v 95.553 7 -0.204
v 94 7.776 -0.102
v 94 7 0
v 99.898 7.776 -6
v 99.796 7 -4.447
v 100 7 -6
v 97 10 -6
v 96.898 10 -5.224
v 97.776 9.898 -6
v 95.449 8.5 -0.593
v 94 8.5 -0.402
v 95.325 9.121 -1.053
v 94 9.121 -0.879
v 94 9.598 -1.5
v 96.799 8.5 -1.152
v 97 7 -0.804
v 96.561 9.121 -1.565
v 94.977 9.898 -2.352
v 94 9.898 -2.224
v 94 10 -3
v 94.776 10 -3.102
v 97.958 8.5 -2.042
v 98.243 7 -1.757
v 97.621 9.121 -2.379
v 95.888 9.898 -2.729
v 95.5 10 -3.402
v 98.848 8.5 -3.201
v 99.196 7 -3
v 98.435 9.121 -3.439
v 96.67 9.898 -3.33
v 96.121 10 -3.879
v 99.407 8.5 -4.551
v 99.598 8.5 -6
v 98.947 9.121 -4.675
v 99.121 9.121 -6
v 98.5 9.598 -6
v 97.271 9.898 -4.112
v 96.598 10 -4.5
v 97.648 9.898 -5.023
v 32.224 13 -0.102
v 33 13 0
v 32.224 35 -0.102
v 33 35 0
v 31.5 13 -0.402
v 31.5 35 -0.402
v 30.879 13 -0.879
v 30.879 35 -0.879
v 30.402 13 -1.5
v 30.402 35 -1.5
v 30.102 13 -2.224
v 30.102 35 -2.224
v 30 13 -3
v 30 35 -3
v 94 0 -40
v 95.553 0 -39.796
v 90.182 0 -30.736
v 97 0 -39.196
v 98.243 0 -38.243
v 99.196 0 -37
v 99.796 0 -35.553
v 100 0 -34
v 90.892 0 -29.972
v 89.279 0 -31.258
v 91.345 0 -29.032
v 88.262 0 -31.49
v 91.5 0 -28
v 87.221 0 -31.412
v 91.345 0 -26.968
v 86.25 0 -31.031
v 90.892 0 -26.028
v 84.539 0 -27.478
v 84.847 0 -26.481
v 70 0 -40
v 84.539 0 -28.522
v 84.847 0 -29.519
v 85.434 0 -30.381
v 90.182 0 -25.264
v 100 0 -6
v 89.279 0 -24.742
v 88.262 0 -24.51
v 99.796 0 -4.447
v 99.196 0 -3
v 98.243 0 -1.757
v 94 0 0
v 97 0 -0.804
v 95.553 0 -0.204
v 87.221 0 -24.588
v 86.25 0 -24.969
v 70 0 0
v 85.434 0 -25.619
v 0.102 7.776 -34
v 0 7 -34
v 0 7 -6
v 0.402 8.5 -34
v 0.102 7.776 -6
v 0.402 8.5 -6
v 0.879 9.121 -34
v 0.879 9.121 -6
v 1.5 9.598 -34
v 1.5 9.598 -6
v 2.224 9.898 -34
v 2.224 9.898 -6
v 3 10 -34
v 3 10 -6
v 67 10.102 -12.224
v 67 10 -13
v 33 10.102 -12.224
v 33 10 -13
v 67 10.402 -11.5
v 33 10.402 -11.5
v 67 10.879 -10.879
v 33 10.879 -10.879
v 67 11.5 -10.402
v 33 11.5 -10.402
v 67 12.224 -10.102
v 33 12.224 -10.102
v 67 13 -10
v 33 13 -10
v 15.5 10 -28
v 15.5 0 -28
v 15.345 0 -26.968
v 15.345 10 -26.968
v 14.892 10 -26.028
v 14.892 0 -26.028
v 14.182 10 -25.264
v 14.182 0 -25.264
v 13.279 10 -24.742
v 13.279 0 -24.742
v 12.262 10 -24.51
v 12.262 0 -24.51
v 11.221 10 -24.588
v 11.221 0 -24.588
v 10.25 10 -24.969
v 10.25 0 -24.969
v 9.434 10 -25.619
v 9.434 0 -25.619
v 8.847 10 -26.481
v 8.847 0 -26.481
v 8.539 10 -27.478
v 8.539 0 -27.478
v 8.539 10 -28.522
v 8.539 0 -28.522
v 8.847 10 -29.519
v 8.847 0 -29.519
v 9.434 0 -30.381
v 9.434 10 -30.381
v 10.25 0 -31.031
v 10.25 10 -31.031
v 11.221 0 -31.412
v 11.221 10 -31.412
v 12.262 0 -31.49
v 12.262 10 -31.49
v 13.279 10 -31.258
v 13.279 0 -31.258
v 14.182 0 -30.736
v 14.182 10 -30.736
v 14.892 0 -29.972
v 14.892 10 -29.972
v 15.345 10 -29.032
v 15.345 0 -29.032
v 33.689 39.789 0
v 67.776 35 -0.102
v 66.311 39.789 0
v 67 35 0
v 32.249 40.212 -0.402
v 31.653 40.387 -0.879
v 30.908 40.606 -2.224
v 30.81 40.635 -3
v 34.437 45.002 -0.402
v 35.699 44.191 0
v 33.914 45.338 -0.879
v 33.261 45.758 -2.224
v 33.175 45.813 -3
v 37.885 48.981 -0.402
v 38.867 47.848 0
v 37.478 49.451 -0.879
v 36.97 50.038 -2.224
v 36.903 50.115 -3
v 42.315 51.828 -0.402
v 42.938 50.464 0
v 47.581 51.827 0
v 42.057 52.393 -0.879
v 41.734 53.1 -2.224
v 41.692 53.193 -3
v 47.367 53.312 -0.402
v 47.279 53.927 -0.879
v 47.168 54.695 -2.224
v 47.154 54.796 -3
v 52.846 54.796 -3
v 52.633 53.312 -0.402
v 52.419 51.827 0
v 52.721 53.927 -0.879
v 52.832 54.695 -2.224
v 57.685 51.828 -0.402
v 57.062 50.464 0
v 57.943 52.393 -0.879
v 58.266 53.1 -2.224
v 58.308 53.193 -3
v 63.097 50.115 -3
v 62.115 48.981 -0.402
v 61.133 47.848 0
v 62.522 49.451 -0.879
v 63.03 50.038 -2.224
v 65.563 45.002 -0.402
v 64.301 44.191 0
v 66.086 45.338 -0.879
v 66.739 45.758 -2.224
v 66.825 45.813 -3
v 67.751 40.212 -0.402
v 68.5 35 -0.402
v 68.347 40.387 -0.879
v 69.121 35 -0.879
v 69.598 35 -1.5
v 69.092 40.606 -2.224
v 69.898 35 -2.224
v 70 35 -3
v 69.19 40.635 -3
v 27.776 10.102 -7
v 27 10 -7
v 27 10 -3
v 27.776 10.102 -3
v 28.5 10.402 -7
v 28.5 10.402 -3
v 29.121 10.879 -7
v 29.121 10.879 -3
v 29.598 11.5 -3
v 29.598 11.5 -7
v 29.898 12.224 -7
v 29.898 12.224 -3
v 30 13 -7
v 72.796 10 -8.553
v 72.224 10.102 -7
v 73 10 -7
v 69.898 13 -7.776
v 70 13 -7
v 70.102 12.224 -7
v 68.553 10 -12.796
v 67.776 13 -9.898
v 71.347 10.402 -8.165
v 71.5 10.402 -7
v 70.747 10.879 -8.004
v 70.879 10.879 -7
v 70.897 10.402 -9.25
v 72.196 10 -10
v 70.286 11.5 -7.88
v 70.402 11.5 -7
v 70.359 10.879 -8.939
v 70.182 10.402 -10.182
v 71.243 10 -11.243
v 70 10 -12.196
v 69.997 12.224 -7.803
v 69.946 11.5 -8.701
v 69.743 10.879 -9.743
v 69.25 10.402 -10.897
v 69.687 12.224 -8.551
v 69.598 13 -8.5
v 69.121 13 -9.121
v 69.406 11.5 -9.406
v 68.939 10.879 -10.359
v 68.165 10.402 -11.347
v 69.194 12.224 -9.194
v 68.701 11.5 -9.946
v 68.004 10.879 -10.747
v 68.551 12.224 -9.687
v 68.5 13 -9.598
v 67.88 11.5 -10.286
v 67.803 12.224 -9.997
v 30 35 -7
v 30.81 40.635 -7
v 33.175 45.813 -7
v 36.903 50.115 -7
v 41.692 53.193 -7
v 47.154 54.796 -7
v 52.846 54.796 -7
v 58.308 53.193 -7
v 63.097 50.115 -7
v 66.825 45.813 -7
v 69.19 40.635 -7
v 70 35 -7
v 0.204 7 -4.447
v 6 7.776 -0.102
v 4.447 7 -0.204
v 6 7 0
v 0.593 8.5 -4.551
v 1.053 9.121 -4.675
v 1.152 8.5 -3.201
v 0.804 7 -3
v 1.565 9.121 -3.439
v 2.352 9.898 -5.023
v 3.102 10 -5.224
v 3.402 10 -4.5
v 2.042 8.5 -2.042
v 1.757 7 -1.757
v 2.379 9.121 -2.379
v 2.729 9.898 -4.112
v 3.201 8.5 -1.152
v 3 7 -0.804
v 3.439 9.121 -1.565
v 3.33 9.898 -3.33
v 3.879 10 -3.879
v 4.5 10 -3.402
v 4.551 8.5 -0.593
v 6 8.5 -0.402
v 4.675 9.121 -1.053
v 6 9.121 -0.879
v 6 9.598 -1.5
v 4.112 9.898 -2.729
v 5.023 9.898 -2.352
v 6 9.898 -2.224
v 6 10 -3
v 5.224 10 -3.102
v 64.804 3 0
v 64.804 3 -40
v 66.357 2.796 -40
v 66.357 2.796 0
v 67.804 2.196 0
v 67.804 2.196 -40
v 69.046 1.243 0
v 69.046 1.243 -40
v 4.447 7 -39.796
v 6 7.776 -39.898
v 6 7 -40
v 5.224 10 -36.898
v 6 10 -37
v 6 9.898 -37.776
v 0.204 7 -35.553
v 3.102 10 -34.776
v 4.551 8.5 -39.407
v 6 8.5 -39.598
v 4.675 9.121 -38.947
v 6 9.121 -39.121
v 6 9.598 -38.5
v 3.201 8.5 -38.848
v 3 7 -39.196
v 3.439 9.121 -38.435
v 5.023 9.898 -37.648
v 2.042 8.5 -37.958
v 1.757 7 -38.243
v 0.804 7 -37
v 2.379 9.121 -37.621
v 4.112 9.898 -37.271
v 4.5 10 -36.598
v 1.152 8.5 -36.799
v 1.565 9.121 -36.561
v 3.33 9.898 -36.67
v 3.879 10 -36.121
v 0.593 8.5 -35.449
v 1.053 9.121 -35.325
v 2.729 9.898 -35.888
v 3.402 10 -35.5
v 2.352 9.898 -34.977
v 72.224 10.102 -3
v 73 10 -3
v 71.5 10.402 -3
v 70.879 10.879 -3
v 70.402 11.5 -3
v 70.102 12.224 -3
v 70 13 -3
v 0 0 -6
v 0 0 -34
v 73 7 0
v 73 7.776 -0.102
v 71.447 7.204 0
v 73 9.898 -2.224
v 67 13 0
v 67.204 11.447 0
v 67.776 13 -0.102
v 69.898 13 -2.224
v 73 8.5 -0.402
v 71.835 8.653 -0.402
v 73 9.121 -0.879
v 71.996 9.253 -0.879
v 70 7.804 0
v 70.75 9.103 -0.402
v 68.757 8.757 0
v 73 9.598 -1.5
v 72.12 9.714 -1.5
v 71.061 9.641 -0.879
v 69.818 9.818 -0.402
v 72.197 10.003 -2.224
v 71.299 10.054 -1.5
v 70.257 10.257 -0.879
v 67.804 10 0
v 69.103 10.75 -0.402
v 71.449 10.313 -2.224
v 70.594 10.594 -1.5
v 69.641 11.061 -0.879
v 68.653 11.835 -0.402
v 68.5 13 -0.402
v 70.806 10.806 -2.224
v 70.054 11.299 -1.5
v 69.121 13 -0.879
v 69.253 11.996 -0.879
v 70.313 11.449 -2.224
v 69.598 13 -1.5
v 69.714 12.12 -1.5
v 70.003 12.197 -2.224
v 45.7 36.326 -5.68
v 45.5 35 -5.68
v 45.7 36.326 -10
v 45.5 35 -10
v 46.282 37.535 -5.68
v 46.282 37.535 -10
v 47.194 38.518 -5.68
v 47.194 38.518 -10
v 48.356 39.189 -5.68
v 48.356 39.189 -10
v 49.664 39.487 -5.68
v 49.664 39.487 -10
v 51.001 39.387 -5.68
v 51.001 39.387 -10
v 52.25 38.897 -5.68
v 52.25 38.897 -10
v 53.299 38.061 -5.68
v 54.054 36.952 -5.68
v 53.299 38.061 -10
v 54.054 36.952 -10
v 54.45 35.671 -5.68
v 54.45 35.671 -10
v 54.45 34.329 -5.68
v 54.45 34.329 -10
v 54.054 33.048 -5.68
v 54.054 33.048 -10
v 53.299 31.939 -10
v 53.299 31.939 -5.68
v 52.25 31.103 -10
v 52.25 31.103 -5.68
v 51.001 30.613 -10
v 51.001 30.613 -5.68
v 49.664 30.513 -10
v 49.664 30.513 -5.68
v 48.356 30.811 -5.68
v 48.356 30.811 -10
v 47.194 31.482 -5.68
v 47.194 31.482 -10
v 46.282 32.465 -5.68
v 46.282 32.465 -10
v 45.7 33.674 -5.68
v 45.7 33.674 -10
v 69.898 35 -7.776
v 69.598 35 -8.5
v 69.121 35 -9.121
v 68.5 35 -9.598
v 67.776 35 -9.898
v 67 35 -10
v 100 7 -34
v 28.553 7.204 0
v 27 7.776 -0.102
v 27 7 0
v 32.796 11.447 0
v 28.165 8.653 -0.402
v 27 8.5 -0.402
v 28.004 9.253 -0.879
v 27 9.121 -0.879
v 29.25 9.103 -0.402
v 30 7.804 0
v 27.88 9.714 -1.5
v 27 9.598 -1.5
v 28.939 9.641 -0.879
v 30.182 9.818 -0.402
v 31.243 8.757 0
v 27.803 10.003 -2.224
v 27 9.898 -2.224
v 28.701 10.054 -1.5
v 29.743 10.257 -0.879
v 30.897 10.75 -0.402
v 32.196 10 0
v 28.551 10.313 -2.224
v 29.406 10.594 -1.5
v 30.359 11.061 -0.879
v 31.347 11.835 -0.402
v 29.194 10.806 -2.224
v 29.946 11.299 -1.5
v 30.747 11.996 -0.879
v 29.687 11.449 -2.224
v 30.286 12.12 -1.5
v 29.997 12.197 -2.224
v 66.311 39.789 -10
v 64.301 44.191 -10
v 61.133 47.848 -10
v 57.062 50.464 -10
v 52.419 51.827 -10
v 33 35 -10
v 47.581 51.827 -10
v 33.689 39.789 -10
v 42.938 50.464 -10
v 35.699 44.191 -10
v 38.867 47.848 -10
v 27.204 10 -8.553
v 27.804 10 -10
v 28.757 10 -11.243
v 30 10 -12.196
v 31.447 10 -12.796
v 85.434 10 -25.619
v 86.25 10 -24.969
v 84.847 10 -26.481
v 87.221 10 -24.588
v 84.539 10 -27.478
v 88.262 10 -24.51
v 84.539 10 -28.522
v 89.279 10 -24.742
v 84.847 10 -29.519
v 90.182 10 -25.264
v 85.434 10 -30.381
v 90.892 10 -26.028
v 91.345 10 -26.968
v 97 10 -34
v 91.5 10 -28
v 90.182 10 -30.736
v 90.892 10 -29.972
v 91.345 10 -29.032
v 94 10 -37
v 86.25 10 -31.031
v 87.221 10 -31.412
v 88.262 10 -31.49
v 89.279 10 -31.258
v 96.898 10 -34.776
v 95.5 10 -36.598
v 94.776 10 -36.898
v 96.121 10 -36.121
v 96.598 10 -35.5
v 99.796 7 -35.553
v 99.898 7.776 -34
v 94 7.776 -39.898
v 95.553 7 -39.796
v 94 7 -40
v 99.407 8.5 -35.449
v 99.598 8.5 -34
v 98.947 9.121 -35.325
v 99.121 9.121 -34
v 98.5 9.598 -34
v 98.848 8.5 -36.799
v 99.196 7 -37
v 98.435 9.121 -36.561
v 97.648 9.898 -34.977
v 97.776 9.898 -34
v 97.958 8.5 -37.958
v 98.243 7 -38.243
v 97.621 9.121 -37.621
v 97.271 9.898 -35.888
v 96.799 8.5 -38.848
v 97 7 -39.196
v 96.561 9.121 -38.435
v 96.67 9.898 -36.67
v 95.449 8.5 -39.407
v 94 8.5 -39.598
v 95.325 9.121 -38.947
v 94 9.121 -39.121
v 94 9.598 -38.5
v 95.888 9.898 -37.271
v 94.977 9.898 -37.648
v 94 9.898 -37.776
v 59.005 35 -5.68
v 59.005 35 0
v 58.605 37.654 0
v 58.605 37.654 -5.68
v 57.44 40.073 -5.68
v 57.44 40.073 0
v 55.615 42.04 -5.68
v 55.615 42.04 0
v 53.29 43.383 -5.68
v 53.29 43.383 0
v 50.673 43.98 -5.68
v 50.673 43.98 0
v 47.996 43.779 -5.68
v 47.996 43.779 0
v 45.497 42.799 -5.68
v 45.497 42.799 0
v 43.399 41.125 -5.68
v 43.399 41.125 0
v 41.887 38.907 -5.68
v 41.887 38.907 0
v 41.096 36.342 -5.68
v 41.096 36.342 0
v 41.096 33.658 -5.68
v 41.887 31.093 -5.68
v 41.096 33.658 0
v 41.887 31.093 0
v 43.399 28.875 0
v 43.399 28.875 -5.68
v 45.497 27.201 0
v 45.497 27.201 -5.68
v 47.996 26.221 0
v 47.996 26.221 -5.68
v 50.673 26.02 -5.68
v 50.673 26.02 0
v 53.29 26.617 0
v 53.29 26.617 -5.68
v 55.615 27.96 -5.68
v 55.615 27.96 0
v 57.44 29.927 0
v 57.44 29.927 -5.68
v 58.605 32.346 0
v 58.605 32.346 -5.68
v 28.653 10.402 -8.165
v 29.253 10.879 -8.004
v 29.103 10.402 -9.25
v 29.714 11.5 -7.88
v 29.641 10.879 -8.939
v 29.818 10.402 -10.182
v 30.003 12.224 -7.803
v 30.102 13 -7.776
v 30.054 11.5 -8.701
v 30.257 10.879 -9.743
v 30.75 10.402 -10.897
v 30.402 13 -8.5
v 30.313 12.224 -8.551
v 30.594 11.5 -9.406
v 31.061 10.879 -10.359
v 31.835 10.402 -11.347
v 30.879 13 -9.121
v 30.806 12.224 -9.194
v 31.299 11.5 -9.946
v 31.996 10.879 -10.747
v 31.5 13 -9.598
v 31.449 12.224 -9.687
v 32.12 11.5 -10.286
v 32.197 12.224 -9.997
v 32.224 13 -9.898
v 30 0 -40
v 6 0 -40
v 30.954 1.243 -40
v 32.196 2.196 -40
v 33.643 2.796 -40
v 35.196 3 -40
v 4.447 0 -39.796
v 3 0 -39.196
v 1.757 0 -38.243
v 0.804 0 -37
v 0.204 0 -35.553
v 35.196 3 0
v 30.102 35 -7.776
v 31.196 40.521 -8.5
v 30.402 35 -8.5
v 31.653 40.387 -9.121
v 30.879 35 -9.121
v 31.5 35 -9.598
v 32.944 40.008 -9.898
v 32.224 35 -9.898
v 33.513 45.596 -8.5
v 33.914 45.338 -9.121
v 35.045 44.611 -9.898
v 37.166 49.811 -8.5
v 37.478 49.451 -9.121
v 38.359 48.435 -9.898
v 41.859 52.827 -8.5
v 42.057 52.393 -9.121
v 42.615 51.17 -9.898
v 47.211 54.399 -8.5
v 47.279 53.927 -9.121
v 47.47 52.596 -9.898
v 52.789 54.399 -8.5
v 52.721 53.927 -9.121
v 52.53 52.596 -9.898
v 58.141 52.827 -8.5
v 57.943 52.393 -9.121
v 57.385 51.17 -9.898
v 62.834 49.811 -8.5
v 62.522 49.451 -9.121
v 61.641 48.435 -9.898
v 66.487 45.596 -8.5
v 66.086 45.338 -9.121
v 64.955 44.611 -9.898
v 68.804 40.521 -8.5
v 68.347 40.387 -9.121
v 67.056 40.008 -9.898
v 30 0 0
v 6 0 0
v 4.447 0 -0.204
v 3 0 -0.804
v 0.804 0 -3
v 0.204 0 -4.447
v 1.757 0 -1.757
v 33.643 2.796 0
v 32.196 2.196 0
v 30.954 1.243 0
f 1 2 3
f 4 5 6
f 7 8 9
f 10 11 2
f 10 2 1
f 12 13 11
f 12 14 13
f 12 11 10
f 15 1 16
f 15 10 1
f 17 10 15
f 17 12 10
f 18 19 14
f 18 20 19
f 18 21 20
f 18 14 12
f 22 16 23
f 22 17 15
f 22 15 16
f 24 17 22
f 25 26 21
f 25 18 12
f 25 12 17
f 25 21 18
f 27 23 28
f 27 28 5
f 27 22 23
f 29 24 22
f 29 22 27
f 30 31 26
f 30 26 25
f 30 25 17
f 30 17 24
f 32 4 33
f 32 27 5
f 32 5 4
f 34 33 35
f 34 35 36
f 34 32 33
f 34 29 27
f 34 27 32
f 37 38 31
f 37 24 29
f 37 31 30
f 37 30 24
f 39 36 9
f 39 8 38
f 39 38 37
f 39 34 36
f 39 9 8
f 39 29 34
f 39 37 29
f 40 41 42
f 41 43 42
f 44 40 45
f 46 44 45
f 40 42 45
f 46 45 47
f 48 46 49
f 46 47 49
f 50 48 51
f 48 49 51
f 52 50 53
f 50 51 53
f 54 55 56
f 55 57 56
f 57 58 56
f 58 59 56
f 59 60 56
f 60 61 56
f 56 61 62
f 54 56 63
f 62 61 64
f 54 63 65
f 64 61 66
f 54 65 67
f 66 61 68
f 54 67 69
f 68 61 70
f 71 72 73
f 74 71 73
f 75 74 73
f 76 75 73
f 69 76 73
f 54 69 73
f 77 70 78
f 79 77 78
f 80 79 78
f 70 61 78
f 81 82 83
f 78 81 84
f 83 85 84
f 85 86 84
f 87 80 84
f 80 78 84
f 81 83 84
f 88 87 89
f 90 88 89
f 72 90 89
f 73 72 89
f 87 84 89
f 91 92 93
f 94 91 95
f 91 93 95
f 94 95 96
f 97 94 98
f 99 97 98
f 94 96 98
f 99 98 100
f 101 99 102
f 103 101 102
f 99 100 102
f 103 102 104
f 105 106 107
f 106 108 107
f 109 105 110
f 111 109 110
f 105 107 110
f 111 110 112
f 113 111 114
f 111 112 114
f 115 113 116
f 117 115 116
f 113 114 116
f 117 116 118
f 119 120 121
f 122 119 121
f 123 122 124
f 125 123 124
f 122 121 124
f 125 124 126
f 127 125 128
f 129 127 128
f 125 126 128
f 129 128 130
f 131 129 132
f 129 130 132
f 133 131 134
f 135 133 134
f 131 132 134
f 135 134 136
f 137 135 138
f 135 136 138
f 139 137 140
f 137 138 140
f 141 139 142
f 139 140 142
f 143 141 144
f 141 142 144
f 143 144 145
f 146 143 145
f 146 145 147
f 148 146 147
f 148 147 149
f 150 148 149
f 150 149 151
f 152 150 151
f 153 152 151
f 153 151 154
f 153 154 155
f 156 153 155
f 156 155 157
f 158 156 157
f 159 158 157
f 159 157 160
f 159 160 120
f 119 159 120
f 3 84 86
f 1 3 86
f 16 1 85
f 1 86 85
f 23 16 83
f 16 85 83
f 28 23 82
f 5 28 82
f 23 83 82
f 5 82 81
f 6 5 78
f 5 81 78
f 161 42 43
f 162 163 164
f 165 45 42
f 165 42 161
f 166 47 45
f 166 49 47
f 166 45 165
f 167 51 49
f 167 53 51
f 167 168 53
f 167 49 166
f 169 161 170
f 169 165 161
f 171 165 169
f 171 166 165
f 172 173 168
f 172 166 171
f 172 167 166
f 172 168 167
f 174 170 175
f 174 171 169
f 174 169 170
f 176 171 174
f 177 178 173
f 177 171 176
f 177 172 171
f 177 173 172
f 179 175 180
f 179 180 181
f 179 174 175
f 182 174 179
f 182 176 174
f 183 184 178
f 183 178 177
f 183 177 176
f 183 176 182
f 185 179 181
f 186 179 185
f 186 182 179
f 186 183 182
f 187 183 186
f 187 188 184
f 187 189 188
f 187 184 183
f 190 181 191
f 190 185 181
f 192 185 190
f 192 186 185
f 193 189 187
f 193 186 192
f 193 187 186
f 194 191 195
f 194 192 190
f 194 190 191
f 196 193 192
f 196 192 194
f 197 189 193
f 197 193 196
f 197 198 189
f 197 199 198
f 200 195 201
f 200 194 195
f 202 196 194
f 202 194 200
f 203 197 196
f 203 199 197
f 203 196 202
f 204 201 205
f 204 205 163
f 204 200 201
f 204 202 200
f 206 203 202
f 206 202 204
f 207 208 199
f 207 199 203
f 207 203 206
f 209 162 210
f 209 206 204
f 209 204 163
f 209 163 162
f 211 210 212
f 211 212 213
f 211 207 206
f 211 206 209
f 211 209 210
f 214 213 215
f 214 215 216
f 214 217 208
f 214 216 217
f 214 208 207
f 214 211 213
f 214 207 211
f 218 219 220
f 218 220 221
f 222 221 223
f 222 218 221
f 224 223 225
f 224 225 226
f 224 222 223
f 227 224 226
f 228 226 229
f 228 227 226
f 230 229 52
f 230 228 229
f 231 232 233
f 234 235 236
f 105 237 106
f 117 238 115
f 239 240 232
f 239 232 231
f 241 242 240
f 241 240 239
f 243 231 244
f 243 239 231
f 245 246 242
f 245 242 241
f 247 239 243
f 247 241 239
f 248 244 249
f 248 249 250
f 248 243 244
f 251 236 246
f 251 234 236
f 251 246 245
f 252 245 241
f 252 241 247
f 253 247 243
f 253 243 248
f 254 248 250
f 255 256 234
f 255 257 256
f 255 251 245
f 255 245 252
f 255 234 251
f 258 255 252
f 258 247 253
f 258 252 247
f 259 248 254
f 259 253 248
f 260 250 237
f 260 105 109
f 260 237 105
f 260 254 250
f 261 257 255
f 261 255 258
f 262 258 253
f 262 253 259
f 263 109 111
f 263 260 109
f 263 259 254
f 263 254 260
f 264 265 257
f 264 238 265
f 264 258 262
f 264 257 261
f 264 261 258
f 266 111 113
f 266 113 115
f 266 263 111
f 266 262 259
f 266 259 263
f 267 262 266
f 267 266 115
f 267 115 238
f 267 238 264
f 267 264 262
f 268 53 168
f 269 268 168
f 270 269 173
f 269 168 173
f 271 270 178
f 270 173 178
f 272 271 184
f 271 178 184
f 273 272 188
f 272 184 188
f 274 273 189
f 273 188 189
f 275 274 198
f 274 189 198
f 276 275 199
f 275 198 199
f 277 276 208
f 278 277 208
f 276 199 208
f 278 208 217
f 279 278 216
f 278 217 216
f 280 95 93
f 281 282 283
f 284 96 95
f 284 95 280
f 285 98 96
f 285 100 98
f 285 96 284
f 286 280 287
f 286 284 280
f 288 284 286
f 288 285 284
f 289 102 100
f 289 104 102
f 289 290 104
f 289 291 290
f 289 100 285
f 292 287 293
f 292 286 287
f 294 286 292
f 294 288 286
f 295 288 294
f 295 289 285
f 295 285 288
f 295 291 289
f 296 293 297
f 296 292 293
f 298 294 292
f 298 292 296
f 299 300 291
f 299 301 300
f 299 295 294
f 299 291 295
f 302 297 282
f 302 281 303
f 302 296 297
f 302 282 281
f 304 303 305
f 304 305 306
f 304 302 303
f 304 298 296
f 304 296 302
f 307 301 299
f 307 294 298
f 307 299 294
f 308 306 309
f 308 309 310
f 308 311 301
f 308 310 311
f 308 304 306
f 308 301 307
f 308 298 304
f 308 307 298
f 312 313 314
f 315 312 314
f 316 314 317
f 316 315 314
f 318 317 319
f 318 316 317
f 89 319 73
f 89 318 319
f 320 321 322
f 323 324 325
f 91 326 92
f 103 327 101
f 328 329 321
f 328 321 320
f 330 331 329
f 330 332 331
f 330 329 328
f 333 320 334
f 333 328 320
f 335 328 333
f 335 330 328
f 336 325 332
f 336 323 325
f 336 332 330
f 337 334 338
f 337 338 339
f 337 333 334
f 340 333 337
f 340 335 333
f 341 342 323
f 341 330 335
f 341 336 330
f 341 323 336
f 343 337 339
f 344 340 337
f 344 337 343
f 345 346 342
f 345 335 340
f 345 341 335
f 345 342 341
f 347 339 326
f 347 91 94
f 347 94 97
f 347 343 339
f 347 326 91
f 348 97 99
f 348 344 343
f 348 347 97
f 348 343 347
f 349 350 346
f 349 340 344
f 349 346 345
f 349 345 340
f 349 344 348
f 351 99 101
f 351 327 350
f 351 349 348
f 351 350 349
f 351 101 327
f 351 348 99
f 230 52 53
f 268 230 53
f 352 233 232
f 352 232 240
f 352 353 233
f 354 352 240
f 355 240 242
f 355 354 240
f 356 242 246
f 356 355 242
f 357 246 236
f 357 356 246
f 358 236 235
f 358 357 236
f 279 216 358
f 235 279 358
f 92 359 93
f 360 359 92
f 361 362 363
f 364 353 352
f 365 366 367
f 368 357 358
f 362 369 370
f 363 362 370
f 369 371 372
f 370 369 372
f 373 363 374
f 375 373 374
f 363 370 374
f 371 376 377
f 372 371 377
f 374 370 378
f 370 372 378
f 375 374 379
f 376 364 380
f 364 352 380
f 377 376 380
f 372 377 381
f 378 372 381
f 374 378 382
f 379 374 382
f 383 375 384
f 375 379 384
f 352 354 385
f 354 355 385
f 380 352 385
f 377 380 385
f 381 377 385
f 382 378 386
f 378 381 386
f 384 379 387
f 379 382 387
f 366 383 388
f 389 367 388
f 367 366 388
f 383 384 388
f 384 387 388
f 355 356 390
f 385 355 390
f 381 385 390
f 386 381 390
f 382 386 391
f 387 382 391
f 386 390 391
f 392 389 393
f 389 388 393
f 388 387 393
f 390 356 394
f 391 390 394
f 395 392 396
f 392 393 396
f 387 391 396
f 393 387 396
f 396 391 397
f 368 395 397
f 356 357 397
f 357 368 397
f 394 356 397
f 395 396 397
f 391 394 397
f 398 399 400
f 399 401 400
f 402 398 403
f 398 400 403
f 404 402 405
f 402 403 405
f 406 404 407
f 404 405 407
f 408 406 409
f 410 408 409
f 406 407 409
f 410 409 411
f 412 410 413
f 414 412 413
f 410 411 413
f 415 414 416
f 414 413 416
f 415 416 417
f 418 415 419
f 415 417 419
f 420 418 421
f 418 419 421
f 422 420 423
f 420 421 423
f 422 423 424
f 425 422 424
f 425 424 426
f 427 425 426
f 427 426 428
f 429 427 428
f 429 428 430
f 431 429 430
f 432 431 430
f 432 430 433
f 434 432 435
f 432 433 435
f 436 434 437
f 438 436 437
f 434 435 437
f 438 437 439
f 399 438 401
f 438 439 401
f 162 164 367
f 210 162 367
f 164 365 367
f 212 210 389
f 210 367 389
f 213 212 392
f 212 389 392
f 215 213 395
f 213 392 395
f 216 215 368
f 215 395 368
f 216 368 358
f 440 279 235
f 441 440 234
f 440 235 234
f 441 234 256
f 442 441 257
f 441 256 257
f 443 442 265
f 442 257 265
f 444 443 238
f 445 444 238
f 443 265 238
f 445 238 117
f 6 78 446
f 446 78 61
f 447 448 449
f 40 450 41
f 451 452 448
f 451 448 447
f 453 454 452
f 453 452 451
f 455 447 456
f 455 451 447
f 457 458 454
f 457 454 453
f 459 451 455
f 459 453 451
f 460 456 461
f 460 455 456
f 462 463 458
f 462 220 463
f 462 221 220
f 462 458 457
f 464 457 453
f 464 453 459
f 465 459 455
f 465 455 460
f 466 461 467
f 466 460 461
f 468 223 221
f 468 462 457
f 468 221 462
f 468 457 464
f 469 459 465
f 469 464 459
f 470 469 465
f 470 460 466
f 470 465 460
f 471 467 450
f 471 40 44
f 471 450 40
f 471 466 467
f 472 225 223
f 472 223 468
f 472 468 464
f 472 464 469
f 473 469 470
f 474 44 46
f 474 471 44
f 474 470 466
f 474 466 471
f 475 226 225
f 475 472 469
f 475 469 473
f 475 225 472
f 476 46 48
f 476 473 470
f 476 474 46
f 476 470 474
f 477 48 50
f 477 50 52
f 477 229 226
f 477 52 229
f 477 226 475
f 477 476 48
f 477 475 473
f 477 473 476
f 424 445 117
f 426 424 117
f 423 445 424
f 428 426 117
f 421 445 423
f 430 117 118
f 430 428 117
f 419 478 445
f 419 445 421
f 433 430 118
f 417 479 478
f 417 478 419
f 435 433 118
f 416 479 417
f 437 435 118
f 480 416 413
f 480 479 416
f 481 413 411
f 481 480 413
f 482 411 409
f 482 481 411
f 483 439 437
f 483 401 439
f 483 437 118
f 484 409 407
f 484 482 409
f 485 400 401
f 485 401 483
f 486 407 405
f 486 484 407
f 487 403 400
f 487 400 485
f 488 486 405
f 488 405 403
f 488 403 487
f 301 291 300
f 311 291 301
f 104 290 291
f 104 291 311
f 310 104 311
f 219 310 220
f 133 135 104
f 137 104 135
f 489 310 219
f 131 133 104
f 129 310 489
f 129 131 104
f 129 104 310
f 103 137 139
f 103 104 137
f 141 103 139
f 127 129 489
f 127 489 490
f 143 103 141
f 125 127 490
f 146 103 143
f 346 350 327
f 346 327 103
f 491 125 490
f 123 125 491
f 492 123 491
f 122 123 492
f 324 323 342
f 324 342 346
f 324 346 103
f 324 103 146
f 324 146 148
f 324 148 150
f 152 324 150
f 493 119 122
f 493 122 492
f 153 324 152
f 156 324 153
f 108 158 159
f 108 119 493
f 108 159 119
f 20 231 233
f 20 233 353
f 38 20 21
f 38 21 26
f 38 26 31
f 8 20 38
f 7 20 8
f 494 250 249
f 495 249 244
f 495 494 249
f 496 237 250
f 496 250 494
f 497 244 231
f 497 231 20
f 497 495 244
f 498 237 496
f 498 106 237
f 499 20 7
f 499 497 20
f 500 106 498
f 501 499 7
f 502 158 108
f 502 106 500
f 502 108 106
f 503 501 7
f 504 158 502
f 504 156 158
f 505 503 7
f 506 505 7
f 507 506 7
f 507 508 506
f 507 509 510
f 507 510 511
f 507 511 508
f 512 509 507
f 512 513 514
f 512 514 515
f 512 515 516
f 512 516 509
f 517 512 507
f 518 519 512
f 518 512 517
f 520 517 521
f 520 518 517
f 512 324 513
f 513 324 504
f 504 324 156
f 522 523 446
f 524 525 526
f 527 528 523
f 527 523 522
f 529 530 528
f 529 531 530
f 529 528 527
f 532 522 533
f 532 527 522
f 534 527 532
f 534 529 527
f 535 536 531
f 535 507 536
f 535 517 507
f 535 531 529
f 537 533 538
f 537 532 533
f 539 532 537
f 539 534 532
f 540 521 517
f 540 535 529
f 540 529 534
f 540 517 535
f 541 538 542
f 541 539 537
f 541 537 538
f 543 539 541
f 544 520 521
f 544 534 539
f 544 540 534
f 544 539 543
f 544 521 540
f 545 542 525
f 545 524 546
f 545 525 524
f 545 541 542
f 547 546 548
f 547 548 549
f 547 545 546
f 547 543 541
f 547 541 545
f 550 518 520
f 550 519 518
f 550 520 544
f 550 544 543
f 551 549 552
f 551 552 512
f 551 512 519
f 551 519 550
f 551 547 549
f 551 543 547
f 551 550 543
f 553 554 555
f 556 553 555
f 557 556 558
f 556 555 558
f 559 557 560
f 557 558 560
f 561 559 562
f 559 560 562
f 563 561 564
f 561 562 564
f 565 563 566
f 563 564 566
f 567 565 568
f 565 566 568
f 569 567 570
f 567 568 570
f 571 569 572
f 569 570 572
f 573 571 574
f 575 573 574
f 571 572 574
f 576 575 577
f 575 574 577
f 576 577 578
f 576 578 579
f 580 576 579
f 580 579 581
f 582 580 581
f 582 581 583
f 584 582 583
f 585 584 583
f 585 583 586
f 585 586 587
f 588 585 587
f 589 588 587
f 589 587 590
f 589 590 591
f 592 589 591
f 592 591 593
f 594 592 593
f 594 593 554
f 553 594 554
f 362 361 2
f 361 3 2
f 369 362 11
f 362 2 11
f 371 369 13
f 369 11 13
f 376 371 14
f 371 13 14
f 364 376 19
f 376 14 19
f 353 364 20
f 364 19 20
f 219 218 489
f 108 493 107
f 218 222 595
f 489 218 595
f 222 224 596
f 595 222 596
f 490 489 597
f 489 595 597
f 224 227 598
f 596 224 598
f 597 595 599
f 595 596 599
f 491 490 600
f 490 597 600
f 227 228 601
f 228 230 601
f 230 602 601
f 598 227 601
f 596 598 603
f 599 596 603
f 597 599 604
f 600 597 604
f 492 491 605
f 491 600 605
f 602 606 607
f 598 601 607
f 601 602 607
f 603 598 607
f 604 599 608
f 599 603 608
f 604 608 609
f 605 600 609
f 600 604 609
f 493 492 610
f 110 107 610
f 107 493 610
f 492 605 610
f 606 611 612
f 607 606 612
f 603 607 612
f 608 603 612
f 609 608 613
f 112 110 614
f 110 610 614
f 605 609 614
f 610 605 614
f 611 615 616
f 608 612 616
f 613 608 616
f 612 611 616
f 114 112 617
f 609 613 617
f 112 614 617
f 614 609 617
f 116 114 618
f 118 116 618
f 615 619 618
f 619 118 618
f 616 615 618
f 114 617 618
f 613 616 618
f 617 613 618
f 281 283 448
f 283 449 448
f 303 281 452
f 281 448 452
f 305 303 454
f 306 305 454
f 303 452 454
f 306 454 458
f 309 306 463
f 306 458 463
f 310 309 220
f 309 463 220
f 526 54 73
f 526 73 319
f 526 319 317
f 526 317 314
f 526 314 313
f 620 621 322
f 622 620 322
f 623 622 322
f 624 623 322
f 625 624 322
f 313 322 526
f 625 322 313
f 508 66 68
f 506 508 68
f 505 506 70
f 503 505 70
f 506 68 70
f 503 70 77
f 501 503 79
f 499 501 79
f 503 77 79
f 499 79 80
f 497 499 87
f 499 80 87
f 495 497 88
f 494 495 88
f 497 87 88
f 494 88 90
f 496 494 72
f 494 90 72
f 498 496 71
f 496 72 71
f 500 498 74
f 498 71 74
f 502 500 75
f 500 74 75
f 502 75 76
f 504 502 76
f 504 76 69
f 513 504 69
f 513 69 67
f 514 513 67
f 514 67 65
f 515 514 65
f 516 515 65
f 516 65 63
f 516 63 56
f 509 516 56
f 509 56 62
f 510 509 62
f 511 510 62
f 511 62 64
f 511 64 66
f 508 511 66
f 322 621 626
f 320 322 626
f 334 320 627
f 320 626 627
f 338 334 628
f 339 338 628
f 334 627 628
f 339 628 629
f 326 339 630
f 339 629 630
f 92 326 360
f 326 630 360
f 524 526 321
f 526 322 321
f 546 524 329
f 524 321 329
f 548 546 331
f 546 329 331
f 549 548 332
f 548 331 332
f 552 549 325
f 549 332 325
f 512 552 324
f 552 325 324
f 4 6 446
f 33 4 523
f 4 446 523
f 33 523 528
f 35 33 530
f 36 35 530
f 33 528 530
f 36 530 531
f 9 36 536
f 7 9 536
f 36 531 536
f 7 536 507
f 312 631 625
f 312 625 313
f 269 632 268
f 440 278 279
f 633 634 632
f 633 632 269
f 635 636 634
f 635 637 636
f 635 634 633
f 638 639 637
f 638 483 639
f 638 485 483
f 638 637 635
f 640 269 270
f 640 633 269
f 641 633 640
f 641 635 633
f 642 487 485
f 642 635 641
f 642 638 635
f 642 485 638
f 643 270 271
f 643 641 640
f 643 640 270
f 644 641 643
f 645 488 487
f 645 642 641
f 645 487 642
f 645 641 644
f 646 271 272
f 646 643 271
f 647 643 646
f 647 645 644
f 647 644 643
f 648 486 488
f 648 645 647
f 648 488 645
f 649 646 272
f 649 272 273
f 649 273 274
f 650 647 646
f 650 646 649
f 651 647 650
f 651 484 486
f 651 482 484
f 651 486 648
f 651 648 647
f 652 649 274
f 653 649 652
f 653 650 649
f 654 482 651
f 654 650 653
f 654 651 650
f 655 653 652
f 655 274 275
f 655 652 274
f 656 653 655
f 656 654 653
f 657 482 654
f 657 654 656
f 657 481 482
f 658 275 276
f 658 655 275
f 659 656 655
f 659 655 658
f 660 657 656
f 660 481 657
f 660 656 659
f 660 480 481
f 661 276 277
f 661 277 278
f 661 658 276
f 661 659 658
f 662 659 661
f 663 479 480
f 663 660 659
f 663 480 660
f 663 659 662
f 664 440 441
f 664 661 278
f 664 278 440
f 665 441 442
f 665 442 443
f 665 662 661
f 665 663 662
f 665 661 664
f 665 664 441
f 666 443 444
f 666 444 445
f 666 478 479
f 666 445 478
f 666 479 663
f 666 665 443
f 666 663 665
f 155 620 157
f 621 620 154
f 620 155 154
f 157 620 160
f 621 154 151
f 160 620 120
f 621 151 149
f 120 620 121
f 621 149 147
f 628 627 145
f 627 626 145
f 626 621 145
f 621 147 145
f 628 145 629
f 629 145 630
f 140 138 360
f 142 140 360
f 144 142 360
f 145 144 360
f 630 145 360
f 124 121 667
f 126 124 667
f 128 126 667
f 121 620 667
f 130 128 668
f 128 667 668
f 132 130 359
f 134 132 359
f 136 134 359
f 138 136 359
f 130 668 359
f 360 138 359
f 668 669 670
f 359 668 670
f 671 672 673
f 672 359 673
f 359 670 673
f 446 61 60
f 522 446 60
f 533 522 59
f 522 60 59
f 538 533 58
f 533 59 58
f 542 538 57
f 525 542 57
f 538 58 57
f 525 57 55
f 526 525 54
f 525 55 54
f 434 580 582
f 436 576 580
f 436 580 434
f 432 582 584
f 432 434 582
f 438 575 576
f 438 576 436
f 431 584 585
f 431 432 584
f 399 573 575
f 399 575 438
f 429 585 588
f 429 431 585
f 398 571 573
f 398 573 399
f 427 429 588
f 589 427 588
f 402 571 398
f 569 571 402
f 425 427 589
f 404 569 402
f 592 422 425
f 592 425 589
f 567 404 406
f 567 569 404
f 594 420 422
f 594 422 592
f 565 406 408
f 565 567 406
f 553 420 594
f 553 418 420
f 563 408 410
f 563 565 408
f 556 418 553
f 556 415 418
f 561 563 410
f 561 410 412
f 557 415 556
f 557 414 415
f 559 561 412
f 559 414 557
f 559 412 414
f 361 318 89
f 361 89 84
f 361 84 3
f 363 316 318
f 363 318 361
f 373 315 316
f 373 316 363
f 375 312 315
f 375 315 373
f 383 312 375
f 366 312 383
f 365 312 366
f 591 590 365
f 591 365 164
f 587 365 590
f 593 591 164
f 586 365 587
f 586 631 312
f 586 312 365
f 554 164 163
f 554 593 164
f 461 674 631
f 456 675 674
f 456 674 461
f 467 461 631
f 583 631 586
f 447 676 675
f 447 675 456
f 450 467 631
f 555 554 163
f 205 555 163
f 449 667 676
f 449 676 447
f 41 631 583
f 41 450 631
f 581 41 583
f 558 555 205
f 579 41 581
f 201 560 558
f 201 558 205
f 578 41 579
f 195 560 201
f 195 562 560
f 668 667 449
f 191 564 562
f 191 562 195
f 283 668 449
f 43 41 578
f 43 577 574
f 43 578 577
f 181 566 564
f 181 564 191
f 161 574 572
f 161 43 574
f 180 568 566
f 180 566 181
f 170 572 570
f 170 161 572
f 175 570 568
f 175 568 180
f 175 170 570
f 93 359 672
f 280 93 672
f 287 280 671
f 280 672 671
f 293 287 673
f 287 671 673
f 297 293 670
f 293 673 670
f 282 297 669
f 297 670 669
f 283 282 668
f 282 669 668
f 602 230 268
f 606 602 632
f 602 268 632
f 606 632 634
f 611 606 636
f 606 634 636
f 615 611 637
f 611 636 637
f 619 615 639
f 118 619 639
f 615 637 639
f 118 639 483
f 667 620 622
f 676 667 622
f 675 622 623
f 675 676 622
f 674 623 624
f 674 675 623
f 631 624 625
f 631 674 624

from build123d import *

# Parameters (mm, degrees)
SKETCH1_W                               = 100
SKETCH1_H                               = 40
BASE_PLATE_DEPTH                        = 10
VERT_BOSS_DEPTH                         = 10
SKETCH5_W                               = 40
SKETCH5_H                               = 3
SLOT_DEPTH                              = 121.933866224
HOLE_WIZARD_7_0_7_1_D                   = 7
CBORE_FOR_M8_HEX_HEAD_BOLT1_D           = 9
CBORE_FOR_M8_HEX_HEAD_BOLT1_CBORE_D     = 18.01
CBORE_FOR_M8_HEX_HEAD_BOLT1_CBORE_DEPTH = 5.68
FILLET_1_R                              = 6
FILLET_2_R                              = 3


with BuildPart() as part:
    # Sketch1 → Base Plate (new body)
    with BuildSketch(Plane(origin=(0, 0, 0), x_dir=(1, 0, 0), z_dir=(0, 1, 0))):
        with Locations((50, 20)):
            Rectangle(SKETCH1_W, SKETCH1_H)
    extrude(amount=BASE_PLATE_DEPTH)

    # Sketch2 → Vert Boss (add)
    with BuildSketch(Plane.XY):
        with BuildLine():
            Line((30, 0), (30, 35))
            ThreePointArc((30, 35), (50, 55), (70, 35))
            Line((70, 35), (70, 0))
            Line((70, 0), (30, 0))
        make_face()
    extrude(amount=-VERT_BOSS_DEPTH)

    # Sketch5 → Slot (cut, through all)
    with BuildSketch(Plane.XY):
        with Locations((50, 1.5)):
            Rectangle(SKETCH5_W, SKETCH5_H)
    extrude(amount=-SLOT_DEPTH, mode=Mode.SUBTRACT)

    # Ø7.0 (7) 直徑孔1 (through all)
    with Locations(Plane(origin=(0, 10, 0), x_dir=(-1, 0, 0), z_dir=(0, 1, 0))):
        with Locations((-88, -28), (-12, -28)):
            Hole(HOLE_WIZARD_7_0_7_1_D / 2)

    # CBORE for M8 Hex Head Bolt1 (through all)
    with Locations(Plane.XY):
        with Locations((50, 35)):
            CounterBoreHole(CBORE_FOR_M8_HEX_HEAD_BOLT1_D / 2, CBORE_FOR_M8_HEX_HEAD_BOLT1_CBORE_D / 2, CBORE_FOR_M8_HEX_HEAD_BOLT1_CBORE_DEPTH)

    # 圓角1
    # the kernel refuses this fillet: 6 mm, written as the material it adds along each edge
    with BuildSketch(Plane(origin=(70, 3, 0), x_dir=(-1, 0, 0), z_dir=(0, 0, -1))) as fillet_1_piece_1:
        with BuildLine():
            CenterArc((5.196152423, -6), FILLET_1_R, 90, 60)
            Line((0, -3), (0, 0))
            Line((0, 0), (5.196152423, 0))
        make_face()
    extrude(amount=40)
    with BuildSketch(Plane(origin=(30, 3, 0), x_dir=(0, -1, 0), z_dir=(0, 0, -1))) as fillet_1_piece_2:
        with BuildLine():
            CenterArc((6, -5.196152423), FILLET_1_R, 120, 60)
            Line((0, -5.196152423), (0, 0))
            Line((0, 0), (3, 0))
        make_face()
    extrude(amount=40)
    # the kernel refuses this fillet: 6 mm, written as the material it takes off along each edge
    with BuildSketch(Plane(origin=(0, -15, 0), x_dir=(1, 0, 0), z_dir=(0, 1, 0)), Plane(origin=(0, -15, -40), x_dir=(0, 0, 1), z_dir=(0, 1, 0))) as fillet_1_2_piece_1:
        with BuildLine():
            CenterArc((FILLET_1_R, FILLET_1_R), FILLET_1_R, 180, 90)
            Line((0, FILLET_1_R), (0, 0))
            Line((0, 0), (FILLET_1_R, 0))
        make_face()
    extrude(amount=40, mode=Mode.SUBTRACT)
    with BuildSketch(Plane(origin=(100, -15, -40), x_dir=(0, 0, 1), z_dir=(0, 1, 0)), Plane(origin=(100, -15, 0), x_dir=(-1, 0, 0), z_dir=(0, 1, 0))) as fillet_1_2_piece_2:
        with BuildLine():
            CenterArc((FILLET_1_R, -FILLET_1_R), FILLET_1_R, 90, 90)
            Line((0, -FILLET_1_R), (0, 0))
            Line((0, 0), (FILLET_1_R, 0))
        make_face()
    extrude(amount=40, mode=Mode.SUBTRACT)

    # 圓角2
    fillet_2_edges = [part.edges().sort_by_distance(p)[0] for p in [
        (82, 10, 0),
        (30, 22.5, -10),
        (70, 22.5, -10),
        (30, 22.5, 0),
        (70, 22.5, 0),
        (50, 55, 0),
        (30, 10, -5),
        (50, 55, -10),
        (70, 10, -5),
        (50, 10, -10),
        (18, 10, 0),
        (0, 10, -20),
        (100, 10, -20),
        (50, 10, -40),
        (98.242640687, 10, -1.757359313),
        (98.242640687, 10, -38.242640687),
        (1.757359313, 10, -38.242640687),
        (1.757359313, 10, -1.757359313),
    ]]
    fillet(fillet_2_edges, radius=FILLET_2_R)


solid = part.part
